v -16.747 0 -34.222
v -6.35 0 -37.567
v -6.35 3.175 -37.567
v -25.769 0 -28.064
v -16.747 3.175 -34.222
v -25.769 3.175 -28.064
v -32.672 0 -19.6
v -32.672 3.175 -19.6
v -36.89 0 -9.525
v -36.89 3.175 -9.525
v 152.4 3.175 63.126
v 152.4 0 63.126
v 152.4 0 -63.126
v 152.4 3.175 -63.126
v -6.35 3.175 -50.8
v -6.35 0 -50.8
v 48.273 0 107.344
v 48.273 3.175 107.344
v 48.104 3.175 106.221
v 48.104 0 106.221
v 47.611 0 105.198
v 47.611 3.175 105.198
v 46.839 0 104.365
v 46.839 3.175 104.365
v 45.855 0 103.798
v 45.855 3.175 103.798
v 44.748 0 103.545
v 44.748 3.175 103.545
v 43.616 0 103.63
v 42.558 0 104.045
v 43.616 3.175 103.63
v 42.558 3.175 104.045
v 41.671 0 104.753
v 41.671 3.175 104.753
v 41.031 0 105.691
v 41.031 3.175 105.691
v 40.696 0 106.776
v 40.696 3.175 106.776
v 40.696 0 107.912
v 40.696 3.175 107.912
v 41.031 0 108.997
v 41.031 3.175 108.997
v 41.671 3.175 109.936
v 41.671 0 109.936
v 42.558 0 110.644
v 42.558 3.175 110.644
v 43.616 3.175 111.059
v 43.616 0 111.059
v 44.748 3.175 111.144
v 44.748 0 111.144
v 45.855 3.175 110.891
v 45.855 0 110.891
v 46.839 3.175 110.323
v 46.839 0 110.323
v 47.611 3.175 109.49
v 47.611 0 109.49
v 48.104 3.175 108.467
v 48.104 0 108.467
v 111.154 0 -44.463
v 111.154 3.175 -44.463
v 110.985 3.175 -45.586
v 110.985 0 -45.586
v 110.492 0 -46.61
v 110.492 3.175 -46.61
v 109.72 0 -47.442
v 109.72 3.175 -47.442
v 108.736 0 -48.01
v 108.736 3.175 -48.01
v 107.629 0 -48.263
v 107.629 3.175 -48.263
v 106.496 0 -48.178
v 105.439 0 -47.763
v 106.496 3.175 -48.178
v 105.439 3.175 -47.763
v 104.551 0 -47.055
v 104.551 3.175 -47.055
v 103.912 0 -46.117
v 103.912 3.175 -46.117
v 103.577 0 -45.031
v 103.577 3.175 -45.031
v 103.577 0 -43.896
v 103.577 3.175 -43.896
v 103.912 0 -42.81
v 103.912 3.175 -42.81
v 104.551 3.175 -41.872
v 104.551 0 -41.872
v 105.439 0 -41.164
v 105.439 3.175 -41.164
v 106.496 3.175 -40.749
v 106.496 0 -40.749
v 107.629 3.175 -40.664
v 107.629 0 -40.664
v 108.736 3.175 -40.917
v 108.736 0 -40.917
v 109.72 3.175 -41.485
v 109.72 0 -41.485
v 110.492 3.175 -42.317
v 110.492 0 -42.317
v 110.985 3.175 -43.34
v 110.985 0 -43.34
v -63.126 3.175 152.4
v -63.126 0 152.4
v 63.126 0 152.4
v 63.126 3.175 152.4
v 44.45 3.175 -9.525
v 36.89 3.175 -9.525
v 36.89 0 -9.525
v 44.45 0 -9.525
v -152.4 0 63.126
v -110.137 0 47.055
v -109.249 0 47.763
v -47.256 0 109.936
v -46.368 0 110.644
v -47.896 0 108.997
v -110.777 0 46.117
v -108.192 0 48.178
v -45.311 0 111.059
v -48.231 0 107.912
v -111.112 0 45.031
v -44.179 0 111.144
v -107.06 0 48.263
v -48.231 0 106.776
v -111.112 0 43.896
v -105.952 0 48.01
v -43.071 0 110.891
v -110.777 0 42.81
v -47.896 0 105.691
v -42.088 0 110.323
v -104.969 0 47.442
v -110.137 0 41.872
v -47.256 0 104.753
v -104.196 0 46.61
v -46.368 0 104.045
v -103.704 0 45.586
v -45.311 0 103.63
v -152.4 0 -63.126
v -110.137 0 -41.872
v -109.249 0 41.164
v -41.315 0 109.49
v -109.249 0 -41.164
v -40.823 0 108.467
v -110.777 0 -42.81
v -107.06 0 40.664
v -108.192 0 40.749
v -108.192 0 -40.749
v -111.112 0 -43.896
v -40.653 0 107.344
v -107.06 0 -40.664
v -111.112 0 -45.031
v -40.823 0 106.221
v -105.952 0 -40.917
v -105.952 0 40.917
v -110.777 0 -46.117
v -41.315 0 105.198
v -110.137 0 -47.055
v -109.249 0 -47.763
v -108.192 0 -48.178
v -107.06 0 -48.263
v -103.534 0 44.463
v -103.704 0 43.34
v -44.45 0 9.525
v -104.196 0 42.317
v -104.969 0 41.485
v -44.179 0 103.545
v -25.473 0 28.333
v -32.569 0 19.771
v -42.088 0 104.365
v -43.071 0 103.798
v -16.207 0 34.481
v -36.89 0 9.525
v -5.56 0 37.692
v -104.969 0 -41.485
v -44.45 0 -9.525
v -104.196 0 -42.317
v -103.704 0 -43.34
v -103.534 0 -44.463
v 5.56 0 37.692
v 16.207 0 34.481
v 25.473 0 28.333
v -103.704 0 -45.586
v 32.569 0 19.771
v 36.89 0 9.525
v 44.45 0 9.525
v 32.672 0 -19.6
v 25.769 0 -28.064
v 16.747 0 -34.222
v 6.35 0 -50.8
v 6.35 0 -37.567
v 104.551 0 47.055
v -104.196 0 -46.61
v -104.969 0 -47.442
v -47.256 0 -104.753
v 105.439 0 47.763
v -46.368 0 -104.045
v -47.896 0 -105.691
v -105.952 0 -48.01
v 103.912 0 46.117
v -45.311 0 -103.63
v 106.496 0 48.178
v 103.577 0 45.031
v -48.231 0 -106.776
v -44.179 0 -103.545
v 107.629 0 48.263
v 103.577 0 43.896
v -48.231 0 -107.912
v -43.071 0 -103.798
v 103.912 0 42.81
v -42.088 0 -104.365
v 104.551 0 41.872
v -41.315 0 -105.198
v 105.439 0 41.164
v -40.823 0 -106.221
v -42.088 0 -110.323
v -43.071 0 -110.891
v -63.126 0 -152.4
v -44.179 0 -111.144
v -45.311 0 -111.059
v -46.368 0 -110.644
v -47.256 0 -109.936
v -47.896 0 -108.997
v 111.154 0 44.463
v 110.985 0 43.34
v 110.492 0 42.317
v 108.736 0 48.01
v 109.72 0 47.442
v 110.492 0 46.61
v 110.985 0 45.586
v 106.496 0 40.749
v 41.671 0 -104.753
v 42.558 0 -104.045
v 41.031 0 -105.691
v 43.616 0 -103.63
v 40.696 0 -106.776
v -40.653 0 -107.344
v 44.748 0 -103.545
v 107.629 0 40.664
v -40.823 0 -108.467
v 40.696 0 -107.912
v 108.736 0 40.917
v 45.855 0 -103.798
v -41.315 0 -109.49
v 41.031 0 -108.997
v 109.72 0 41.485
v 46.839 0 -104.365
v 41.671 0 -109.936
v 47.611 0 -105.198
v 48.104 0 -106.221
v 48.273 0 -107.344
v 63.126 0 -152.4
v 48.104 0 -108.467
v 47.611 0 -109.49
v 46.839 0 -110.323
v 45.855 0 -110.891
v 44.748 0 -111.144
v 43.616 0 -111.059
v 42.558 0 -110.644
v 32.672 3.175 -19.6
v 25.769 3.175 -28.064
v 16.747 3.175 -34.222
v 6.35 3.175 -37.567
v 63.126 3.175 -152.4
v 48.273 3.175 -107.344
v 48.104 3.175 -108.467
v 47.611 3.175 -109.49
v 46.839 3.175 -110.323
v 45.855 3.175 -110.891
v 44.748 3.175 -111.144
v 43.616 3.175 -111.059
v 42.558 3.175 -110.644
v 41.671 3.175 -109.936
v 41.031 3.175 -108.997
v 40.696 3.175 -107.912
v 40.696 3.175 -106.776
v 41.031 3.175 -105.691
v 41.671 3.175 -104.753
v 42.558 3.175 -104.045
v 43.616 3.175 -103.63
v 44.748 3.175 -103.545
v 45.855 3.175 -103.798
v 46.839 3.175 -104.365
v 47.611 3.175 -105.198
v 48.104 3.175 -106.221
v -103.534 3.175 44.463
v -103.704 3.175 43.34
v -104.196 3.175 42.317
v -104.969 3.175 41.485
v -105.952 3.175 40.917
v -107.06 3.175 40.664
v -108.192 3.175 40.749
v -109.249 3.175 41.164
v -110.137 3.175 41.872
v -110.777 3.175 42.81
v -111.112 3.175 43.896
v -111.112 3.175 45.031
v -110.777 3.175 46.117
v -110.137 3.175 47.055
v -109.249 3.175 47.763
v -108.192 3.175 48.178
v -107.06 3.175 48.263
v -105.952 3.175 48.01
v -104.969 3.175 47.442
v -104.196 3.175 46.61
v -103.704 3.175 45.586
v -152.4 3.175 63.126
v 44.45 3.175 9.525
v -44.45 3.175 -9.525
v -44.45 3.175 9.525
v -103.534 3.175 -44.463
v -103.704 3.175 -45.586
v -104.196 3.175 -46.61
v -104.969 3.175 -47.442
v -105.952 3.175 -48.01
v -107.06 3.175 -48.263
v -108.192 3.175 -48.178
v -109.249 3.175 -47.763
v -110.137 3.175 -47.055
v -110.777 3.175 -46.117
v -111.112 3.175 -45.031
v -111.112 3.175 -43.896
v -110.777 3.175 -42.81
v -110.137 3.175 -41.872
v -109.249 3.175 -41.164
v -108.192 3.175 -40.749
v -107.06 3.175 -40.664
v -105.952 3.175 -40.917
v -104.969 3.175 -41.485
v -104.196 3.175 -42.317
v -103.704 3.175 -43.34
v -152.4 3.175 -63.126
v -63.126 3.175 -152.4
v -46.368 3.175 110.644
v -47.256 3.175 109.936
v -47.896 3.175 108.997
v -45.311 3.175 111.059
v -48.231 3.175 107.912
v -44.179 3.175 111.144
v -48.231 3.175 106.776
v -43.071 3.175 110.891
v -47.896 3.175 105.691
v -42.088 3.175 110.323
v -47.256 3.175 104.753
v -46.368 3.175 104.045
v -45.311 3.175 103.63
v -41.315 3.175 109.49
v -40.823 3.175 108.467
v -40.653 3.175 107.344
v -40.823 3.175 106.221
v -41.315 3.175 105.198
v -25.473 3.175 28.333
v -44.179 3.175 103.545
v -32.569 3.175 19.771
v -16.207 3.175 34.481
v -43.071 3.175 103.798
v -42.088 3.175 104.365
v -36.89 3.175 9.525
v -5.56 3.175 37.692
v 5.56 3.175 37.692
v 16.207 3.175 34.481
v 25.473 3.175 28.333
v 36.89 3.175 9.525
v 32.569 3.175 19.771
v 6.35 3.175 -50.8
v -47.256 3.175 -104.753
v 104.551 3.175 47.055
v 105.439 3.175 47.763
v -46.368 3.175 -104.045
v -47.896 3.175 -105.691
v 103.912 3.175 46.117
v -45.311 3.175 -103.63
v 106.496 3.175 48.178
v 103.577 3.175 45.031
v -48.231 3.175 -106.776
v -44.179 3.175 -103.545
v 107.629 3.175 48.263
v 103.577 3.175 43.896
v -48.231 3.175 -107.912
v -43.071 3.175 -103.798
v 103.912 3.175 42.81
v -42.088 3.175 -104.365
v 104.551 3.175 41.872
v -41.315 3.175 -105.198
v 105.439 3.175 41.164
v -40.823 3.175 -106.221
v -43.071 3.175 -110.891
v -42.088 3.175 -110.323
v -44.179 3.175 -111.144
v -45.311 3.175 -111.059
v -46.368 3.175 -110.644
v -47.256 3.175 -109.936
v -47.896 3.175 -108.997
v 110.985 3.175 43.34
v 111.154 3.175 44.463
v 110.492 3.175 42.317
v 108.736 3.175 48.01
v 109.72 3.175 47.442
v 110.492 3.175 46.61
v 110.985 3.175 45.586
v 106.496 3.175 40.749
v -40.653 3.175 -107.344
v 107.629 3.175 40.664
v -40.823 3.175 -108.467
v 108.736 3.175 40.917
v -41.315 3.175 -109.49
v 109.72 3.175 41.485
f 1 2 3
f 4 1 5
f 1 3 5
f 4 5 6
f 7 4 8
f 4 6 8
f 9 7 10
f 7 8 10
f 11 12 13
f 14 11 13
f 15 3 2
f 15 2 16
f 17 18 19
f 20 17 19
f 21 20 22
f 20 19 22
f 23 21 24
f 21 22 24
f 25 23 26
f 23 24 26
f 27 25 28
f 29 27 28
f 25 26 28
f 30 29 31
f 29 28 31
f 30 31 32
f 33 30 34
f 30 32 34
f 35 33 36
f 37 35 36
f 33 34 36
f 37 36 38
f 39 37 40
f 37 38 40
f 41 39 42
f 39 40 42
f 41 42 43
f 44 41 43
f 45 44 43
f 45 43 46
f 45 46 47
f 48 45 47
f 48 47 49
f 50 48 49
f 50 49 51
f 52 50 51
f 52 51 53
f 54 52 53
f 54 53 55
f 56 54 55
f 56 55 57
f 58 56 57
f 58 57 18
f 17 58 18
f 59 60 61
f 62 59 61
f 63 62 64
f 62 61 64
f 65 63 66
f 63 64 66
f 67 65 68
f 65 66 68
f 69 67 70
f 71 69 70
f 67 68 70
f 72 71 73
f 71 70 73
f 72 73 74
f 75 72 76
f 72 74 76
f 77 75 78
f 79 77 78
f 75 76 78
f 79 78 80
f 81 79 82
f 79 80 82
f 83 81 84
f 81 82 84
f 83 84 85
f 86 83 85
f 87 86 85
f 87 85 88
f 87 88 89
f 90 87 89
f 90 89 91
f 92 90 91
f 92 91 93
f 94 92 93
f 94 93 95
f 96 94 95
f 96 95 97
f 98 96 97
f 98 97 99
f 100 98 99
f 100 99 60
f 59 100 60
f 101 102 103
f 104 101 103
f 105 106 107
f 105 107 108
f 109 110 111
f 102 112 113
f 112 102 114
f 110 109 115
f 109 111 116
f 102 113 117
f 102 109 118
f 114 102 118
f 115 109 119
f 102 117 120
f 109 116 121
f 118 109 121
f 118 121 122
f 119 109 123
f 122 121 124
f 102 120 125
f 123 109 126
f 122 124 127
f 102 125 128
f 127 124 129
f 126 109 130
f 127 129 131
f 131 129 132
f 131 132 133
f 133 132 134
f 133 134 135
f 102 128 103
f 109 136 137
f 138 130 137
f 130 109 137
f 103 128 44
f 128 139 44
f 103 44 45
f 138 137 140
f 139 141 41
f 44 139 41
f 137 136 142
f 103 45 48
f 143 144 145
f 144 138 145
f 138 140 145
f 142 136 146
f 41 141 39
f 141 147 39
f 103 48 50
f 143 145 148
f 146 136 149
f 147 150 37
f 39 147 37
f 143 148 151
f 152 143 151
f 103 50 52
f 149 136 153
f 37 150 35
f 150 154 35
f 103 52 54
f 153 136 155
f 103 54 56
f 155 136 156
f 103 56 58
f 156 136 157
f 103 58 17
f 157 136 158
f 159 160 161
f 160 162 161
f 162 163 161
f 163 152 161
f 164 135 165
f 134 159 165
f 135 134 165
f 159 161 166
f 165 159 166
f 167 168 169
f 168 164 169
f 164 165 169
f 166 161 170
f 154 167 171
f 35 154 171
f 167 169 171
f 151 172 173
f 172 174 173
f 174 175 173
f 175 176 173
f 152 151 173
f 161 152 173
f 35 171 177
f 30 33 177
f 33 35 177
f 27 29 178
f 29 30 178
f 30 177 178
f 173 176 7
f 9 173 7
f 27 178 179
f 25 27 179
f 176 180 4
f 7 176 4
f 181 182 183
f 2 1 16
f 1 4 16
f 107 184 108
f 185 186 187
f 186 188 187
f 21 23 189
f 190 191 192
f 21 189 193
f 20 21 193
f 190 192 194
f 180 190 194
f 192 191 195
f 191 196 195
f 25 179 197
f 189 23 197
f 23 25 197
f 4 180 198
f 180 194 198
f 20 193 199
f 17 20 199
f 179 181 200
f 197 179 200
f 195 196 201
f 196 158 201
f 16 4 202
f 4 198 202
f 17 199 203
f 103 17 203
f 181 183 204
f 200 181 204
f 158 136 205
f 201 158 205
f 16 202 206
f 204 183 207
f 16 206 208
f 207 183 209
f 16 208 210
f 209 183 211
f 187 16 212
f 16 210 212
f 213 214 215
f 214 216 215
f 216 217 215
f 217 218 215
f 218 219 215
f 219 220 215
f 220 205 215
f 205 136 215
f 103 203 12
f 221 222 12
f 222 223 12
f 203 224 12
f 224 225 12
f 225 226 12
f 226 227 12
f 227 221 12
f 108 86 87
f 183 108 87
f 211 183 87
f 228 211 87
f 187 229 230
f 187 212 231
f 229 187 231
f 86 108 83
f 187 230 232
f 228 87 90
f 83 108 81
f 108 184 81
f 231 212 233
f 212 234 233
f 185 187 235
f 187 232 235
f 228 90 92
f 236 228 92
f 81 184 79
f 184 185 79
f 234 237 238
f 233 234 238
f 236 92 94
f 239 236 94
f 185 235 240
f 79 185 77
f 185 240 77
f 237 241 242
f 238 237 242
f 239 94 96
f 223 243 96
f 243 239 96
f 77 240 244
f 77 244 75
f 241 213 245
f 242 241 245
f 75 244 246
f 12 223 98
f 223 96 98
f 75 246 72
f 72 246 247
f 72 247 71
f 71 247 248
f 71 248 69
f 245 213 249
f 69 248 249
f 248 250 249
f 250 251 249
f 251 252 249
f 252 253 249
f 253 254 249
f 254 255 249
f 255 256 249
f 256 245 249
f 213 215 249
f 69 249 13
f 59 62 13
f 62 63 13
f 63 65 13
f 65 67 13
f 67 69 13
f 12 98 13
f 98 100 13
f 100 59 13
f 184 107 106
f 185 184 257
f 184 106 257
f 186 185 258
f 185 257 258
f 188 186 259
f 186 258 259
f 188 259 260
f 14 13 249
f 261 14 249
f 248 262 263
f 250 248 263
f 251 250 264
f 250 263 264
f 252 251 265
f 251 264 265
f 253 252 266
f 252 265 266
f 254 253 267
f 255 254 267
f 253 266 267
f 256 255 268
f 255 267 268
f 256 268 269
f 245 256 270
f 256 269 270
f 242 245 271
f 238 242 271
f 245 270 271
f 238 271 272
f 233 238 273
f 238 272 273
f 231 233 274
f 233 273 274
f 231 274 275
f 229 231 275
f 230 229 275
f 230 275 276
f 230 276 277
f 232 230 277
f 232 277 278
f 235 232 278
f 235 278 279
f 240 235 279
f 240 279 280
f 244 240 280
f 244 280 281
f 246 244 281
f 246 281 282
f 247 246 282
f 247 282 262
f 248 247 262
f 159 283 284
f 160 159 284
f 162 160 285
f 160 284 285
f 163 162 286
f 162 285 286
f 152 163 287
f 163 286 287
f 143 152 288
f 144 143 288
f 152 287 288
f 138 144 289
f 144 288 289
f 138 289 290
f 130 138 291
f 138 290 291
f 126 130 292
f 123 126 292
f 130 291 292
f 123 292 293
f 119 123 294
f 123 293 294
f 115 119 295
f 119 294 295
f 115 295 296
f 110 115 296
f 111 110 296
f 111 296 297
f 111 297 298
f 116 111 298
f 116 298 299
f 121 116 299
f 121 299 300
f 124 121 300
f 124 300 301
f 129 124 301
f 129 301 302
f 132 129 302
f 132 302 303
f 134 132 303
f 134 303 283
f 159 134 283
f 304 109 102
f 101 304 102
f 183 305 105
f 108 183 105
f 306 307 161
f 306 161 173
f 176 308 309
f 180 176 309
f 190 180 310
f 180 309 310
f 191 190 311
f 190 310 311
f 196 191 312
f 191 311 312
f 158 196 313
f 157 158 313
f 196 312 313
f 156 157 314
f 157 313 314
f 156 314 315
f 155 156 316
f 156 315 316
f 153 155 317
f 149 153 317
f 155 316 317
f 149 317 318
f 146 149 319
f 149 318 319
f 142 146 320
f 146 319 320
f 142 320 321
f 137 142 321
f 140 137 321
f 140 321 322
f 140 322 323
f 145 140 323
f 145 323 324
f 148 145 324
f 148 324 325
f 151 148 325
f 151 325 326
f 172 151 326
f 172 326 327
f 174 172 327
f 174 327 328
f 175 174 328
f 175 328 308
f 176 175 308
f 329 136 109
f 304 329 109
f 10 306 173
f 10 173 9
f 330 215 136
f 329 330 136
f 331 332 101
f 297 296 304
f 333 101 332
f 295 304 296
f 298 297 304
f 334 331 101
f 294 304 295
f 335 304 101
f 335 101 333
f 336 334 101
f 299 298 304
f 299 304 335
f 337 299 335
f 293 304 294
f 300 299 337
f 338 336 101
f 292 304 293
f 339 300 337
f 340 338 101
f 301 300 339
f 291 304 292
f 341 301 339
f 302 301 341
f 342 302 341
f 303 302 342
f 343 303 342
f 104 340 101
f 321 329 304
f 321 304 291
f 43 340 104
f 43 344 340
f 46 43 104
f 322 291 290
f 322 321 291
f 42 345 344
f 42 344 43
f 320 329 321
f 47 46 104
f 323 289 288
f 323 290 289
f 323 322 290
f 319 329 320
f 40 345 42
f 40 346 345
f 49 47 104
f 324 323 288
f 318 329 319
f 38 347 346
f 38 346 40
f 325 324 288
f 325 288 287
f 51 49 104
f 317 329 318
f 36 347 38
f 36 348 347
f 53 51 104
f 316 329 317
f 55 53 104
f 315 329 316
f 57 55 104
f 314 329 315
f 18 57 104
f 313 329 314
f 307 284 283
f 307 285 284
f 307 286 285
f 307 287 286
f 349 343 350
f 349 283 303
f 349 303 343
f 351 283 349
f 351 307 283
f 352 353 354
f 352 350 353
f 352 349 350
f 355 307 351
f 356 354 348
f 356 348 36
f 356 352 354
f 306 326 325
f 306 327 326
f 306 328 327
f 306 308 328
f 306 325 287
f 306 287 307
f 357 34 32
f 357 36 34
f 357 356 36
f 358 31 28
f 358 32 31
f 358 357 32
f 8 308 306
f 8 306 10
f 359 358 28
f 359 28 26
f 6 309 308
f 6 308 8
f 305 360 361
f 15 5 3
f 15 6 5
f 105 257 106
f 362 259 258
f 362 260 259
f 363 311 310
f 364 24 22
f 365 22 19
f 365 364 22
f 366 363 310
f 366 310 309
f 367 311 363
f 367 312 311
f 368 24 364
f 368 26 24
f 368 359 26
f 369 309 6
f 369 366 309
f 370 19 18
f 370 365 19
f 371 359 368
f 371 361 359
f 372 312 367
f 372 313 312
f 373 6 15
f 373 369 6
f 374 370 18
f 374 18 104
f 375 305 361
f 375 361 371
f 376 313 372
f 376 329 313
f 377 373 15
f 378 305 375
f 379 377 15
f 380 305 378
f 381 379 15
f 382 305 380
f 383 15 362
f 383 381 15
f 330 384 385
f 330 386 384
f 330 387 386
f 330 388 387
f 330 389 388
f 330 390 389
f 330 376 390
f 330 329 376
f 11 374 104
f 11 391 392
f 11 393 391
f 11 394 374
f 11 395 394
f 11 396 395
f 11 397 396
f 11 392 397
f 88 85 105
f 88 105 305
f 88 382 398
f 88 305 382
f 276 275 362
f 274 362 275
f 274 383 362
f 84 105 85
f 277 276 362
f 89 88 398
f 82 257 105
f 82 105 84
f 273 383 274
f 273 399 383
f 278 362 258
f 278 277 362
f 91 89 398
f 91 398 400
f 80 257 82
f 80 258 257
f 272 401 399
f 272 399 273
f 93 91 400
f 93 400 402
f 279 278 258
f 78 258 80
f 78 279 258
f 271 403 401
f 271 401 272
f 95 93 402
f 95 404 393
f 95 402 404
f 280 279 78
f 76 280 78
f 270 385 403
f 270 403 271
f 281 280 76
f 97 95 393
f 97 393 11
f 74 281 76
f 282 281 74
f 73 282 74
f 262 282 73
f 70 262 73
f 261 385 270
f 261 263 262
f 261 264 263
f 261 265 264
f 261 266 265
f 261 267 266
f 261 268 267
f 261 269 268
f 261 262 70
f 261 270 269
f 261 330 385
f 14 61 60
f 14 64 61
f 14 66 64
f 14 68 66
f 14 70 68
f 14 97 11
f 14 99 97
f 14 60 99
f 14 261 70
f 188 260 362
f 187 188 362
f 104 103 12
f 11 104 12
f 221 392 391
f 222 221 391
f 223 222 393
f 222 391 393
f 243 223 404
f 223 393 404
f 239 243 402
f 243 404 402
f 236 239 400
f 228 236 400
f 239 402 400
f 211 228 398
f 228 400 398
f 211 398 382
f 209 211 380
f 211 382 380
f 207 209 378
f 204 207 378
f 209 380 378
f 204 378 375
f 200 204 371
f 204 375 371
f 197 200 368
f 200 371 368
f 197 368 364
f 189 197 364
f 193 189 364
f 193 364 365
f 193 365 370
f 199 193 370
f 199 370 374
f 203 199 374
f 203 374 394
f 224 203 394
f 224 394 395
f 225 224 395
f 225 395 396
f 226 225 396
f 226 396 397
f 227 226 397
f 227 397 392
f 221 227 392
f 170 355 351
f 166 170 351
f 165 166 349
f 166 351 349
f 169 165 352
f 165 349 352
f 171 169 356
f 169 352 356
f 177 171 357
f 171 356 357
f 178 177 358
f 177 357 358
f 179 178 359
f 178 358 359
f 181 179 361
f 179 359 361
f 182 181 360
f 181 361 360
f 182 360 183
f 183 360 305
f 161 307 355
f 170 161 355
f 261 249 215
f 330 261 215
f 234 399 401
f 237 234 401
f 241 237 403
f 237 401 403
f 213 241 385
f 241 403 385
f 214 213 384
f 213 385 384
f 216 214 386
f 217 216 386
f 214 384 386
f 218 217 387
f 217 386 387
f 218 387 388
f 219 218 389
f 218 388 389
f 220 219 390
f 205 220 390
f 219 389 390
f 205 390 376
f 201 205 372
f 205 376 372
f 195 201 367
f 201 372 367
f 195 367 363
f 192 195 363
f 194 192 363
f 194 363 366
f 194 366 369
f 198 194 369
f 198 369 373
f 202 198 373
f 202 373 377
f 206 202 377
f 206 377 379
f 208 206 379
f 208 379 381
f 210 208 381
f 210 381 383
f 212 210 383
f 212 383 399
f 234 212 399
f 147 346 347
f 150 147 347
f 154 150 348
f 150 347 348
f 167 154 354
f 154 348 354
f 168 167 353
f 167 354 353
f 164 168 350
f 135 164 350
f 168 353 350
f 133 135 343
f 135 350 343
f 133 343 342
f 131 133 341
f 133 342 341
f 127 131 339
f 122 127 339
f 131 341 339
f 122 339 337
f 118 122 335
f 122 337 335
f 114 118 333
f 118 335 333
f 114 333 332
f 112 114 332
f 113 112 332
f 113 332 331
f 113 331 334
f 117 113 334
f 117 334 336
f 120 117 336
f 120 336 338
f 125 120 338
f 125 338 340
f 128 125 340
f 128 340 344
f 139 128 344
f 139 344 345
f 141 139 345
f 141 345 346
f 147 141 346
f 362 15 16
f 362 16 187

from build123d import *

# Parameters (mm, degrees)
BOSS_EXTRUDE1_DEPTH     = 3.175
SKETCH2_R               = 38.1
CUT_EXTRUDE1_DEPTH      = 1
CUT_EXTRUDE1_DEPTH_BACK = 4.175
SKETCH3_R               = 3.81
CUT_EXTRUDE2_DEPTH      = 4.175
SKETCH4_W               = 12.7
SKETCH4_H               = 19.05
SKETCH4_H_2             = 25.4
CUT_EXTRUDE3_DEPTH      = 4.175


with BuildPart() as part:
    # Sketch1 → Boss-Extrude1 (new body)
    with BuildSketch(Plane(origin=(0, 0, 0), x_dir=(1, 0, 0), z_dir=(0, 1, 0))):
        Polygon((63.126146906, 152.4), (-63.126146906, 152.4), (-152.4, 63.126146906), (-152.4, -63.126146906), (-63.126146906, -152.4), (63.126146906, -152.4), (152.4, -63.126146906), (152.4, 63.126146906), align=None)
    extrude(amount=BOSS_EXTRUDE1_DEPTH)

    # Sketch2 → Cut-Extrude1 (cut, two sides)
    with BuildSketch(Plane(origin=(0, 3.175, 0), x_dir=(1, 0, 0), z_dir=(0, 1, 0))) as cut_extrude1_sk:
        Circle(SKETCH2_R)
    extrude(amount=CUT_EXTRUDE1_DEPTH, mode=Mode.SUBTRACT)
    extrude(cut_extrude1_sk.sketch, amount=-CUT_EXTRUDE1_DEPTH_BACK, mode=Mode.SUBTRACT)

    # Sketch3 → Cut-Extrude2 (cut, through all)
    with BuildSketch(Plane(origin=(0, 3.175, 0), x_dir=(1, 0, 0), z_dir=(0, 1, 0))):
        with Locations((44.463441276, -107.344242958)):
            Circle(SKETCH3_R)
        with Locations((-44.463441276, -107.344242958)):
            Circle(SKETCH3_R)
        with Locations((-107.344242958, -44.463441276)):
            Circle(SKETCH3_R)
        with Locations((-107.344242958, 44.463441276)):
            Circle(SKETCH3_R)
        with Locations((-44.463441276, 107.344242958)):
            Circle(SKETCH3_R)
        with Locations((44.463441276, 107.344242958)):
            Circle(SKETCH3_R)
        with Locations((107.344242958, 44.463441276)):
            Circle(SKETCH3_R)
        with Locations((107.344242958, -44.463441276)):
            Circle(SKETCH3_R)
    extrude(amount=-CUT_EXTRUDE2_DEPTH, mode=Mode.SUBTRACT)

    # Sketch4 → Cut-Extrude3 (cut, through all)
    with BuildSketch(Plane(origin=(0, 3.175, 0), x_dir=(1, 0, 0), z_dir=(0, 1, 0))):
        with Locations((-38.1, 0)):
            Rectangle(SKETCH4_W, SKETCH4_H)
        with Locations((38.1, 0)):
            Rectangle(SKETCH4_W, SKETCH4_H)
        with Locations((0, 38.1)):
            Rectangle(SKETCH4_W, SKETCH4_H_2)
    extrude(amount=-CUT_EXTRUDE3_DEPTH, mode=Mode.SUBTRACT)


solid = part.part
